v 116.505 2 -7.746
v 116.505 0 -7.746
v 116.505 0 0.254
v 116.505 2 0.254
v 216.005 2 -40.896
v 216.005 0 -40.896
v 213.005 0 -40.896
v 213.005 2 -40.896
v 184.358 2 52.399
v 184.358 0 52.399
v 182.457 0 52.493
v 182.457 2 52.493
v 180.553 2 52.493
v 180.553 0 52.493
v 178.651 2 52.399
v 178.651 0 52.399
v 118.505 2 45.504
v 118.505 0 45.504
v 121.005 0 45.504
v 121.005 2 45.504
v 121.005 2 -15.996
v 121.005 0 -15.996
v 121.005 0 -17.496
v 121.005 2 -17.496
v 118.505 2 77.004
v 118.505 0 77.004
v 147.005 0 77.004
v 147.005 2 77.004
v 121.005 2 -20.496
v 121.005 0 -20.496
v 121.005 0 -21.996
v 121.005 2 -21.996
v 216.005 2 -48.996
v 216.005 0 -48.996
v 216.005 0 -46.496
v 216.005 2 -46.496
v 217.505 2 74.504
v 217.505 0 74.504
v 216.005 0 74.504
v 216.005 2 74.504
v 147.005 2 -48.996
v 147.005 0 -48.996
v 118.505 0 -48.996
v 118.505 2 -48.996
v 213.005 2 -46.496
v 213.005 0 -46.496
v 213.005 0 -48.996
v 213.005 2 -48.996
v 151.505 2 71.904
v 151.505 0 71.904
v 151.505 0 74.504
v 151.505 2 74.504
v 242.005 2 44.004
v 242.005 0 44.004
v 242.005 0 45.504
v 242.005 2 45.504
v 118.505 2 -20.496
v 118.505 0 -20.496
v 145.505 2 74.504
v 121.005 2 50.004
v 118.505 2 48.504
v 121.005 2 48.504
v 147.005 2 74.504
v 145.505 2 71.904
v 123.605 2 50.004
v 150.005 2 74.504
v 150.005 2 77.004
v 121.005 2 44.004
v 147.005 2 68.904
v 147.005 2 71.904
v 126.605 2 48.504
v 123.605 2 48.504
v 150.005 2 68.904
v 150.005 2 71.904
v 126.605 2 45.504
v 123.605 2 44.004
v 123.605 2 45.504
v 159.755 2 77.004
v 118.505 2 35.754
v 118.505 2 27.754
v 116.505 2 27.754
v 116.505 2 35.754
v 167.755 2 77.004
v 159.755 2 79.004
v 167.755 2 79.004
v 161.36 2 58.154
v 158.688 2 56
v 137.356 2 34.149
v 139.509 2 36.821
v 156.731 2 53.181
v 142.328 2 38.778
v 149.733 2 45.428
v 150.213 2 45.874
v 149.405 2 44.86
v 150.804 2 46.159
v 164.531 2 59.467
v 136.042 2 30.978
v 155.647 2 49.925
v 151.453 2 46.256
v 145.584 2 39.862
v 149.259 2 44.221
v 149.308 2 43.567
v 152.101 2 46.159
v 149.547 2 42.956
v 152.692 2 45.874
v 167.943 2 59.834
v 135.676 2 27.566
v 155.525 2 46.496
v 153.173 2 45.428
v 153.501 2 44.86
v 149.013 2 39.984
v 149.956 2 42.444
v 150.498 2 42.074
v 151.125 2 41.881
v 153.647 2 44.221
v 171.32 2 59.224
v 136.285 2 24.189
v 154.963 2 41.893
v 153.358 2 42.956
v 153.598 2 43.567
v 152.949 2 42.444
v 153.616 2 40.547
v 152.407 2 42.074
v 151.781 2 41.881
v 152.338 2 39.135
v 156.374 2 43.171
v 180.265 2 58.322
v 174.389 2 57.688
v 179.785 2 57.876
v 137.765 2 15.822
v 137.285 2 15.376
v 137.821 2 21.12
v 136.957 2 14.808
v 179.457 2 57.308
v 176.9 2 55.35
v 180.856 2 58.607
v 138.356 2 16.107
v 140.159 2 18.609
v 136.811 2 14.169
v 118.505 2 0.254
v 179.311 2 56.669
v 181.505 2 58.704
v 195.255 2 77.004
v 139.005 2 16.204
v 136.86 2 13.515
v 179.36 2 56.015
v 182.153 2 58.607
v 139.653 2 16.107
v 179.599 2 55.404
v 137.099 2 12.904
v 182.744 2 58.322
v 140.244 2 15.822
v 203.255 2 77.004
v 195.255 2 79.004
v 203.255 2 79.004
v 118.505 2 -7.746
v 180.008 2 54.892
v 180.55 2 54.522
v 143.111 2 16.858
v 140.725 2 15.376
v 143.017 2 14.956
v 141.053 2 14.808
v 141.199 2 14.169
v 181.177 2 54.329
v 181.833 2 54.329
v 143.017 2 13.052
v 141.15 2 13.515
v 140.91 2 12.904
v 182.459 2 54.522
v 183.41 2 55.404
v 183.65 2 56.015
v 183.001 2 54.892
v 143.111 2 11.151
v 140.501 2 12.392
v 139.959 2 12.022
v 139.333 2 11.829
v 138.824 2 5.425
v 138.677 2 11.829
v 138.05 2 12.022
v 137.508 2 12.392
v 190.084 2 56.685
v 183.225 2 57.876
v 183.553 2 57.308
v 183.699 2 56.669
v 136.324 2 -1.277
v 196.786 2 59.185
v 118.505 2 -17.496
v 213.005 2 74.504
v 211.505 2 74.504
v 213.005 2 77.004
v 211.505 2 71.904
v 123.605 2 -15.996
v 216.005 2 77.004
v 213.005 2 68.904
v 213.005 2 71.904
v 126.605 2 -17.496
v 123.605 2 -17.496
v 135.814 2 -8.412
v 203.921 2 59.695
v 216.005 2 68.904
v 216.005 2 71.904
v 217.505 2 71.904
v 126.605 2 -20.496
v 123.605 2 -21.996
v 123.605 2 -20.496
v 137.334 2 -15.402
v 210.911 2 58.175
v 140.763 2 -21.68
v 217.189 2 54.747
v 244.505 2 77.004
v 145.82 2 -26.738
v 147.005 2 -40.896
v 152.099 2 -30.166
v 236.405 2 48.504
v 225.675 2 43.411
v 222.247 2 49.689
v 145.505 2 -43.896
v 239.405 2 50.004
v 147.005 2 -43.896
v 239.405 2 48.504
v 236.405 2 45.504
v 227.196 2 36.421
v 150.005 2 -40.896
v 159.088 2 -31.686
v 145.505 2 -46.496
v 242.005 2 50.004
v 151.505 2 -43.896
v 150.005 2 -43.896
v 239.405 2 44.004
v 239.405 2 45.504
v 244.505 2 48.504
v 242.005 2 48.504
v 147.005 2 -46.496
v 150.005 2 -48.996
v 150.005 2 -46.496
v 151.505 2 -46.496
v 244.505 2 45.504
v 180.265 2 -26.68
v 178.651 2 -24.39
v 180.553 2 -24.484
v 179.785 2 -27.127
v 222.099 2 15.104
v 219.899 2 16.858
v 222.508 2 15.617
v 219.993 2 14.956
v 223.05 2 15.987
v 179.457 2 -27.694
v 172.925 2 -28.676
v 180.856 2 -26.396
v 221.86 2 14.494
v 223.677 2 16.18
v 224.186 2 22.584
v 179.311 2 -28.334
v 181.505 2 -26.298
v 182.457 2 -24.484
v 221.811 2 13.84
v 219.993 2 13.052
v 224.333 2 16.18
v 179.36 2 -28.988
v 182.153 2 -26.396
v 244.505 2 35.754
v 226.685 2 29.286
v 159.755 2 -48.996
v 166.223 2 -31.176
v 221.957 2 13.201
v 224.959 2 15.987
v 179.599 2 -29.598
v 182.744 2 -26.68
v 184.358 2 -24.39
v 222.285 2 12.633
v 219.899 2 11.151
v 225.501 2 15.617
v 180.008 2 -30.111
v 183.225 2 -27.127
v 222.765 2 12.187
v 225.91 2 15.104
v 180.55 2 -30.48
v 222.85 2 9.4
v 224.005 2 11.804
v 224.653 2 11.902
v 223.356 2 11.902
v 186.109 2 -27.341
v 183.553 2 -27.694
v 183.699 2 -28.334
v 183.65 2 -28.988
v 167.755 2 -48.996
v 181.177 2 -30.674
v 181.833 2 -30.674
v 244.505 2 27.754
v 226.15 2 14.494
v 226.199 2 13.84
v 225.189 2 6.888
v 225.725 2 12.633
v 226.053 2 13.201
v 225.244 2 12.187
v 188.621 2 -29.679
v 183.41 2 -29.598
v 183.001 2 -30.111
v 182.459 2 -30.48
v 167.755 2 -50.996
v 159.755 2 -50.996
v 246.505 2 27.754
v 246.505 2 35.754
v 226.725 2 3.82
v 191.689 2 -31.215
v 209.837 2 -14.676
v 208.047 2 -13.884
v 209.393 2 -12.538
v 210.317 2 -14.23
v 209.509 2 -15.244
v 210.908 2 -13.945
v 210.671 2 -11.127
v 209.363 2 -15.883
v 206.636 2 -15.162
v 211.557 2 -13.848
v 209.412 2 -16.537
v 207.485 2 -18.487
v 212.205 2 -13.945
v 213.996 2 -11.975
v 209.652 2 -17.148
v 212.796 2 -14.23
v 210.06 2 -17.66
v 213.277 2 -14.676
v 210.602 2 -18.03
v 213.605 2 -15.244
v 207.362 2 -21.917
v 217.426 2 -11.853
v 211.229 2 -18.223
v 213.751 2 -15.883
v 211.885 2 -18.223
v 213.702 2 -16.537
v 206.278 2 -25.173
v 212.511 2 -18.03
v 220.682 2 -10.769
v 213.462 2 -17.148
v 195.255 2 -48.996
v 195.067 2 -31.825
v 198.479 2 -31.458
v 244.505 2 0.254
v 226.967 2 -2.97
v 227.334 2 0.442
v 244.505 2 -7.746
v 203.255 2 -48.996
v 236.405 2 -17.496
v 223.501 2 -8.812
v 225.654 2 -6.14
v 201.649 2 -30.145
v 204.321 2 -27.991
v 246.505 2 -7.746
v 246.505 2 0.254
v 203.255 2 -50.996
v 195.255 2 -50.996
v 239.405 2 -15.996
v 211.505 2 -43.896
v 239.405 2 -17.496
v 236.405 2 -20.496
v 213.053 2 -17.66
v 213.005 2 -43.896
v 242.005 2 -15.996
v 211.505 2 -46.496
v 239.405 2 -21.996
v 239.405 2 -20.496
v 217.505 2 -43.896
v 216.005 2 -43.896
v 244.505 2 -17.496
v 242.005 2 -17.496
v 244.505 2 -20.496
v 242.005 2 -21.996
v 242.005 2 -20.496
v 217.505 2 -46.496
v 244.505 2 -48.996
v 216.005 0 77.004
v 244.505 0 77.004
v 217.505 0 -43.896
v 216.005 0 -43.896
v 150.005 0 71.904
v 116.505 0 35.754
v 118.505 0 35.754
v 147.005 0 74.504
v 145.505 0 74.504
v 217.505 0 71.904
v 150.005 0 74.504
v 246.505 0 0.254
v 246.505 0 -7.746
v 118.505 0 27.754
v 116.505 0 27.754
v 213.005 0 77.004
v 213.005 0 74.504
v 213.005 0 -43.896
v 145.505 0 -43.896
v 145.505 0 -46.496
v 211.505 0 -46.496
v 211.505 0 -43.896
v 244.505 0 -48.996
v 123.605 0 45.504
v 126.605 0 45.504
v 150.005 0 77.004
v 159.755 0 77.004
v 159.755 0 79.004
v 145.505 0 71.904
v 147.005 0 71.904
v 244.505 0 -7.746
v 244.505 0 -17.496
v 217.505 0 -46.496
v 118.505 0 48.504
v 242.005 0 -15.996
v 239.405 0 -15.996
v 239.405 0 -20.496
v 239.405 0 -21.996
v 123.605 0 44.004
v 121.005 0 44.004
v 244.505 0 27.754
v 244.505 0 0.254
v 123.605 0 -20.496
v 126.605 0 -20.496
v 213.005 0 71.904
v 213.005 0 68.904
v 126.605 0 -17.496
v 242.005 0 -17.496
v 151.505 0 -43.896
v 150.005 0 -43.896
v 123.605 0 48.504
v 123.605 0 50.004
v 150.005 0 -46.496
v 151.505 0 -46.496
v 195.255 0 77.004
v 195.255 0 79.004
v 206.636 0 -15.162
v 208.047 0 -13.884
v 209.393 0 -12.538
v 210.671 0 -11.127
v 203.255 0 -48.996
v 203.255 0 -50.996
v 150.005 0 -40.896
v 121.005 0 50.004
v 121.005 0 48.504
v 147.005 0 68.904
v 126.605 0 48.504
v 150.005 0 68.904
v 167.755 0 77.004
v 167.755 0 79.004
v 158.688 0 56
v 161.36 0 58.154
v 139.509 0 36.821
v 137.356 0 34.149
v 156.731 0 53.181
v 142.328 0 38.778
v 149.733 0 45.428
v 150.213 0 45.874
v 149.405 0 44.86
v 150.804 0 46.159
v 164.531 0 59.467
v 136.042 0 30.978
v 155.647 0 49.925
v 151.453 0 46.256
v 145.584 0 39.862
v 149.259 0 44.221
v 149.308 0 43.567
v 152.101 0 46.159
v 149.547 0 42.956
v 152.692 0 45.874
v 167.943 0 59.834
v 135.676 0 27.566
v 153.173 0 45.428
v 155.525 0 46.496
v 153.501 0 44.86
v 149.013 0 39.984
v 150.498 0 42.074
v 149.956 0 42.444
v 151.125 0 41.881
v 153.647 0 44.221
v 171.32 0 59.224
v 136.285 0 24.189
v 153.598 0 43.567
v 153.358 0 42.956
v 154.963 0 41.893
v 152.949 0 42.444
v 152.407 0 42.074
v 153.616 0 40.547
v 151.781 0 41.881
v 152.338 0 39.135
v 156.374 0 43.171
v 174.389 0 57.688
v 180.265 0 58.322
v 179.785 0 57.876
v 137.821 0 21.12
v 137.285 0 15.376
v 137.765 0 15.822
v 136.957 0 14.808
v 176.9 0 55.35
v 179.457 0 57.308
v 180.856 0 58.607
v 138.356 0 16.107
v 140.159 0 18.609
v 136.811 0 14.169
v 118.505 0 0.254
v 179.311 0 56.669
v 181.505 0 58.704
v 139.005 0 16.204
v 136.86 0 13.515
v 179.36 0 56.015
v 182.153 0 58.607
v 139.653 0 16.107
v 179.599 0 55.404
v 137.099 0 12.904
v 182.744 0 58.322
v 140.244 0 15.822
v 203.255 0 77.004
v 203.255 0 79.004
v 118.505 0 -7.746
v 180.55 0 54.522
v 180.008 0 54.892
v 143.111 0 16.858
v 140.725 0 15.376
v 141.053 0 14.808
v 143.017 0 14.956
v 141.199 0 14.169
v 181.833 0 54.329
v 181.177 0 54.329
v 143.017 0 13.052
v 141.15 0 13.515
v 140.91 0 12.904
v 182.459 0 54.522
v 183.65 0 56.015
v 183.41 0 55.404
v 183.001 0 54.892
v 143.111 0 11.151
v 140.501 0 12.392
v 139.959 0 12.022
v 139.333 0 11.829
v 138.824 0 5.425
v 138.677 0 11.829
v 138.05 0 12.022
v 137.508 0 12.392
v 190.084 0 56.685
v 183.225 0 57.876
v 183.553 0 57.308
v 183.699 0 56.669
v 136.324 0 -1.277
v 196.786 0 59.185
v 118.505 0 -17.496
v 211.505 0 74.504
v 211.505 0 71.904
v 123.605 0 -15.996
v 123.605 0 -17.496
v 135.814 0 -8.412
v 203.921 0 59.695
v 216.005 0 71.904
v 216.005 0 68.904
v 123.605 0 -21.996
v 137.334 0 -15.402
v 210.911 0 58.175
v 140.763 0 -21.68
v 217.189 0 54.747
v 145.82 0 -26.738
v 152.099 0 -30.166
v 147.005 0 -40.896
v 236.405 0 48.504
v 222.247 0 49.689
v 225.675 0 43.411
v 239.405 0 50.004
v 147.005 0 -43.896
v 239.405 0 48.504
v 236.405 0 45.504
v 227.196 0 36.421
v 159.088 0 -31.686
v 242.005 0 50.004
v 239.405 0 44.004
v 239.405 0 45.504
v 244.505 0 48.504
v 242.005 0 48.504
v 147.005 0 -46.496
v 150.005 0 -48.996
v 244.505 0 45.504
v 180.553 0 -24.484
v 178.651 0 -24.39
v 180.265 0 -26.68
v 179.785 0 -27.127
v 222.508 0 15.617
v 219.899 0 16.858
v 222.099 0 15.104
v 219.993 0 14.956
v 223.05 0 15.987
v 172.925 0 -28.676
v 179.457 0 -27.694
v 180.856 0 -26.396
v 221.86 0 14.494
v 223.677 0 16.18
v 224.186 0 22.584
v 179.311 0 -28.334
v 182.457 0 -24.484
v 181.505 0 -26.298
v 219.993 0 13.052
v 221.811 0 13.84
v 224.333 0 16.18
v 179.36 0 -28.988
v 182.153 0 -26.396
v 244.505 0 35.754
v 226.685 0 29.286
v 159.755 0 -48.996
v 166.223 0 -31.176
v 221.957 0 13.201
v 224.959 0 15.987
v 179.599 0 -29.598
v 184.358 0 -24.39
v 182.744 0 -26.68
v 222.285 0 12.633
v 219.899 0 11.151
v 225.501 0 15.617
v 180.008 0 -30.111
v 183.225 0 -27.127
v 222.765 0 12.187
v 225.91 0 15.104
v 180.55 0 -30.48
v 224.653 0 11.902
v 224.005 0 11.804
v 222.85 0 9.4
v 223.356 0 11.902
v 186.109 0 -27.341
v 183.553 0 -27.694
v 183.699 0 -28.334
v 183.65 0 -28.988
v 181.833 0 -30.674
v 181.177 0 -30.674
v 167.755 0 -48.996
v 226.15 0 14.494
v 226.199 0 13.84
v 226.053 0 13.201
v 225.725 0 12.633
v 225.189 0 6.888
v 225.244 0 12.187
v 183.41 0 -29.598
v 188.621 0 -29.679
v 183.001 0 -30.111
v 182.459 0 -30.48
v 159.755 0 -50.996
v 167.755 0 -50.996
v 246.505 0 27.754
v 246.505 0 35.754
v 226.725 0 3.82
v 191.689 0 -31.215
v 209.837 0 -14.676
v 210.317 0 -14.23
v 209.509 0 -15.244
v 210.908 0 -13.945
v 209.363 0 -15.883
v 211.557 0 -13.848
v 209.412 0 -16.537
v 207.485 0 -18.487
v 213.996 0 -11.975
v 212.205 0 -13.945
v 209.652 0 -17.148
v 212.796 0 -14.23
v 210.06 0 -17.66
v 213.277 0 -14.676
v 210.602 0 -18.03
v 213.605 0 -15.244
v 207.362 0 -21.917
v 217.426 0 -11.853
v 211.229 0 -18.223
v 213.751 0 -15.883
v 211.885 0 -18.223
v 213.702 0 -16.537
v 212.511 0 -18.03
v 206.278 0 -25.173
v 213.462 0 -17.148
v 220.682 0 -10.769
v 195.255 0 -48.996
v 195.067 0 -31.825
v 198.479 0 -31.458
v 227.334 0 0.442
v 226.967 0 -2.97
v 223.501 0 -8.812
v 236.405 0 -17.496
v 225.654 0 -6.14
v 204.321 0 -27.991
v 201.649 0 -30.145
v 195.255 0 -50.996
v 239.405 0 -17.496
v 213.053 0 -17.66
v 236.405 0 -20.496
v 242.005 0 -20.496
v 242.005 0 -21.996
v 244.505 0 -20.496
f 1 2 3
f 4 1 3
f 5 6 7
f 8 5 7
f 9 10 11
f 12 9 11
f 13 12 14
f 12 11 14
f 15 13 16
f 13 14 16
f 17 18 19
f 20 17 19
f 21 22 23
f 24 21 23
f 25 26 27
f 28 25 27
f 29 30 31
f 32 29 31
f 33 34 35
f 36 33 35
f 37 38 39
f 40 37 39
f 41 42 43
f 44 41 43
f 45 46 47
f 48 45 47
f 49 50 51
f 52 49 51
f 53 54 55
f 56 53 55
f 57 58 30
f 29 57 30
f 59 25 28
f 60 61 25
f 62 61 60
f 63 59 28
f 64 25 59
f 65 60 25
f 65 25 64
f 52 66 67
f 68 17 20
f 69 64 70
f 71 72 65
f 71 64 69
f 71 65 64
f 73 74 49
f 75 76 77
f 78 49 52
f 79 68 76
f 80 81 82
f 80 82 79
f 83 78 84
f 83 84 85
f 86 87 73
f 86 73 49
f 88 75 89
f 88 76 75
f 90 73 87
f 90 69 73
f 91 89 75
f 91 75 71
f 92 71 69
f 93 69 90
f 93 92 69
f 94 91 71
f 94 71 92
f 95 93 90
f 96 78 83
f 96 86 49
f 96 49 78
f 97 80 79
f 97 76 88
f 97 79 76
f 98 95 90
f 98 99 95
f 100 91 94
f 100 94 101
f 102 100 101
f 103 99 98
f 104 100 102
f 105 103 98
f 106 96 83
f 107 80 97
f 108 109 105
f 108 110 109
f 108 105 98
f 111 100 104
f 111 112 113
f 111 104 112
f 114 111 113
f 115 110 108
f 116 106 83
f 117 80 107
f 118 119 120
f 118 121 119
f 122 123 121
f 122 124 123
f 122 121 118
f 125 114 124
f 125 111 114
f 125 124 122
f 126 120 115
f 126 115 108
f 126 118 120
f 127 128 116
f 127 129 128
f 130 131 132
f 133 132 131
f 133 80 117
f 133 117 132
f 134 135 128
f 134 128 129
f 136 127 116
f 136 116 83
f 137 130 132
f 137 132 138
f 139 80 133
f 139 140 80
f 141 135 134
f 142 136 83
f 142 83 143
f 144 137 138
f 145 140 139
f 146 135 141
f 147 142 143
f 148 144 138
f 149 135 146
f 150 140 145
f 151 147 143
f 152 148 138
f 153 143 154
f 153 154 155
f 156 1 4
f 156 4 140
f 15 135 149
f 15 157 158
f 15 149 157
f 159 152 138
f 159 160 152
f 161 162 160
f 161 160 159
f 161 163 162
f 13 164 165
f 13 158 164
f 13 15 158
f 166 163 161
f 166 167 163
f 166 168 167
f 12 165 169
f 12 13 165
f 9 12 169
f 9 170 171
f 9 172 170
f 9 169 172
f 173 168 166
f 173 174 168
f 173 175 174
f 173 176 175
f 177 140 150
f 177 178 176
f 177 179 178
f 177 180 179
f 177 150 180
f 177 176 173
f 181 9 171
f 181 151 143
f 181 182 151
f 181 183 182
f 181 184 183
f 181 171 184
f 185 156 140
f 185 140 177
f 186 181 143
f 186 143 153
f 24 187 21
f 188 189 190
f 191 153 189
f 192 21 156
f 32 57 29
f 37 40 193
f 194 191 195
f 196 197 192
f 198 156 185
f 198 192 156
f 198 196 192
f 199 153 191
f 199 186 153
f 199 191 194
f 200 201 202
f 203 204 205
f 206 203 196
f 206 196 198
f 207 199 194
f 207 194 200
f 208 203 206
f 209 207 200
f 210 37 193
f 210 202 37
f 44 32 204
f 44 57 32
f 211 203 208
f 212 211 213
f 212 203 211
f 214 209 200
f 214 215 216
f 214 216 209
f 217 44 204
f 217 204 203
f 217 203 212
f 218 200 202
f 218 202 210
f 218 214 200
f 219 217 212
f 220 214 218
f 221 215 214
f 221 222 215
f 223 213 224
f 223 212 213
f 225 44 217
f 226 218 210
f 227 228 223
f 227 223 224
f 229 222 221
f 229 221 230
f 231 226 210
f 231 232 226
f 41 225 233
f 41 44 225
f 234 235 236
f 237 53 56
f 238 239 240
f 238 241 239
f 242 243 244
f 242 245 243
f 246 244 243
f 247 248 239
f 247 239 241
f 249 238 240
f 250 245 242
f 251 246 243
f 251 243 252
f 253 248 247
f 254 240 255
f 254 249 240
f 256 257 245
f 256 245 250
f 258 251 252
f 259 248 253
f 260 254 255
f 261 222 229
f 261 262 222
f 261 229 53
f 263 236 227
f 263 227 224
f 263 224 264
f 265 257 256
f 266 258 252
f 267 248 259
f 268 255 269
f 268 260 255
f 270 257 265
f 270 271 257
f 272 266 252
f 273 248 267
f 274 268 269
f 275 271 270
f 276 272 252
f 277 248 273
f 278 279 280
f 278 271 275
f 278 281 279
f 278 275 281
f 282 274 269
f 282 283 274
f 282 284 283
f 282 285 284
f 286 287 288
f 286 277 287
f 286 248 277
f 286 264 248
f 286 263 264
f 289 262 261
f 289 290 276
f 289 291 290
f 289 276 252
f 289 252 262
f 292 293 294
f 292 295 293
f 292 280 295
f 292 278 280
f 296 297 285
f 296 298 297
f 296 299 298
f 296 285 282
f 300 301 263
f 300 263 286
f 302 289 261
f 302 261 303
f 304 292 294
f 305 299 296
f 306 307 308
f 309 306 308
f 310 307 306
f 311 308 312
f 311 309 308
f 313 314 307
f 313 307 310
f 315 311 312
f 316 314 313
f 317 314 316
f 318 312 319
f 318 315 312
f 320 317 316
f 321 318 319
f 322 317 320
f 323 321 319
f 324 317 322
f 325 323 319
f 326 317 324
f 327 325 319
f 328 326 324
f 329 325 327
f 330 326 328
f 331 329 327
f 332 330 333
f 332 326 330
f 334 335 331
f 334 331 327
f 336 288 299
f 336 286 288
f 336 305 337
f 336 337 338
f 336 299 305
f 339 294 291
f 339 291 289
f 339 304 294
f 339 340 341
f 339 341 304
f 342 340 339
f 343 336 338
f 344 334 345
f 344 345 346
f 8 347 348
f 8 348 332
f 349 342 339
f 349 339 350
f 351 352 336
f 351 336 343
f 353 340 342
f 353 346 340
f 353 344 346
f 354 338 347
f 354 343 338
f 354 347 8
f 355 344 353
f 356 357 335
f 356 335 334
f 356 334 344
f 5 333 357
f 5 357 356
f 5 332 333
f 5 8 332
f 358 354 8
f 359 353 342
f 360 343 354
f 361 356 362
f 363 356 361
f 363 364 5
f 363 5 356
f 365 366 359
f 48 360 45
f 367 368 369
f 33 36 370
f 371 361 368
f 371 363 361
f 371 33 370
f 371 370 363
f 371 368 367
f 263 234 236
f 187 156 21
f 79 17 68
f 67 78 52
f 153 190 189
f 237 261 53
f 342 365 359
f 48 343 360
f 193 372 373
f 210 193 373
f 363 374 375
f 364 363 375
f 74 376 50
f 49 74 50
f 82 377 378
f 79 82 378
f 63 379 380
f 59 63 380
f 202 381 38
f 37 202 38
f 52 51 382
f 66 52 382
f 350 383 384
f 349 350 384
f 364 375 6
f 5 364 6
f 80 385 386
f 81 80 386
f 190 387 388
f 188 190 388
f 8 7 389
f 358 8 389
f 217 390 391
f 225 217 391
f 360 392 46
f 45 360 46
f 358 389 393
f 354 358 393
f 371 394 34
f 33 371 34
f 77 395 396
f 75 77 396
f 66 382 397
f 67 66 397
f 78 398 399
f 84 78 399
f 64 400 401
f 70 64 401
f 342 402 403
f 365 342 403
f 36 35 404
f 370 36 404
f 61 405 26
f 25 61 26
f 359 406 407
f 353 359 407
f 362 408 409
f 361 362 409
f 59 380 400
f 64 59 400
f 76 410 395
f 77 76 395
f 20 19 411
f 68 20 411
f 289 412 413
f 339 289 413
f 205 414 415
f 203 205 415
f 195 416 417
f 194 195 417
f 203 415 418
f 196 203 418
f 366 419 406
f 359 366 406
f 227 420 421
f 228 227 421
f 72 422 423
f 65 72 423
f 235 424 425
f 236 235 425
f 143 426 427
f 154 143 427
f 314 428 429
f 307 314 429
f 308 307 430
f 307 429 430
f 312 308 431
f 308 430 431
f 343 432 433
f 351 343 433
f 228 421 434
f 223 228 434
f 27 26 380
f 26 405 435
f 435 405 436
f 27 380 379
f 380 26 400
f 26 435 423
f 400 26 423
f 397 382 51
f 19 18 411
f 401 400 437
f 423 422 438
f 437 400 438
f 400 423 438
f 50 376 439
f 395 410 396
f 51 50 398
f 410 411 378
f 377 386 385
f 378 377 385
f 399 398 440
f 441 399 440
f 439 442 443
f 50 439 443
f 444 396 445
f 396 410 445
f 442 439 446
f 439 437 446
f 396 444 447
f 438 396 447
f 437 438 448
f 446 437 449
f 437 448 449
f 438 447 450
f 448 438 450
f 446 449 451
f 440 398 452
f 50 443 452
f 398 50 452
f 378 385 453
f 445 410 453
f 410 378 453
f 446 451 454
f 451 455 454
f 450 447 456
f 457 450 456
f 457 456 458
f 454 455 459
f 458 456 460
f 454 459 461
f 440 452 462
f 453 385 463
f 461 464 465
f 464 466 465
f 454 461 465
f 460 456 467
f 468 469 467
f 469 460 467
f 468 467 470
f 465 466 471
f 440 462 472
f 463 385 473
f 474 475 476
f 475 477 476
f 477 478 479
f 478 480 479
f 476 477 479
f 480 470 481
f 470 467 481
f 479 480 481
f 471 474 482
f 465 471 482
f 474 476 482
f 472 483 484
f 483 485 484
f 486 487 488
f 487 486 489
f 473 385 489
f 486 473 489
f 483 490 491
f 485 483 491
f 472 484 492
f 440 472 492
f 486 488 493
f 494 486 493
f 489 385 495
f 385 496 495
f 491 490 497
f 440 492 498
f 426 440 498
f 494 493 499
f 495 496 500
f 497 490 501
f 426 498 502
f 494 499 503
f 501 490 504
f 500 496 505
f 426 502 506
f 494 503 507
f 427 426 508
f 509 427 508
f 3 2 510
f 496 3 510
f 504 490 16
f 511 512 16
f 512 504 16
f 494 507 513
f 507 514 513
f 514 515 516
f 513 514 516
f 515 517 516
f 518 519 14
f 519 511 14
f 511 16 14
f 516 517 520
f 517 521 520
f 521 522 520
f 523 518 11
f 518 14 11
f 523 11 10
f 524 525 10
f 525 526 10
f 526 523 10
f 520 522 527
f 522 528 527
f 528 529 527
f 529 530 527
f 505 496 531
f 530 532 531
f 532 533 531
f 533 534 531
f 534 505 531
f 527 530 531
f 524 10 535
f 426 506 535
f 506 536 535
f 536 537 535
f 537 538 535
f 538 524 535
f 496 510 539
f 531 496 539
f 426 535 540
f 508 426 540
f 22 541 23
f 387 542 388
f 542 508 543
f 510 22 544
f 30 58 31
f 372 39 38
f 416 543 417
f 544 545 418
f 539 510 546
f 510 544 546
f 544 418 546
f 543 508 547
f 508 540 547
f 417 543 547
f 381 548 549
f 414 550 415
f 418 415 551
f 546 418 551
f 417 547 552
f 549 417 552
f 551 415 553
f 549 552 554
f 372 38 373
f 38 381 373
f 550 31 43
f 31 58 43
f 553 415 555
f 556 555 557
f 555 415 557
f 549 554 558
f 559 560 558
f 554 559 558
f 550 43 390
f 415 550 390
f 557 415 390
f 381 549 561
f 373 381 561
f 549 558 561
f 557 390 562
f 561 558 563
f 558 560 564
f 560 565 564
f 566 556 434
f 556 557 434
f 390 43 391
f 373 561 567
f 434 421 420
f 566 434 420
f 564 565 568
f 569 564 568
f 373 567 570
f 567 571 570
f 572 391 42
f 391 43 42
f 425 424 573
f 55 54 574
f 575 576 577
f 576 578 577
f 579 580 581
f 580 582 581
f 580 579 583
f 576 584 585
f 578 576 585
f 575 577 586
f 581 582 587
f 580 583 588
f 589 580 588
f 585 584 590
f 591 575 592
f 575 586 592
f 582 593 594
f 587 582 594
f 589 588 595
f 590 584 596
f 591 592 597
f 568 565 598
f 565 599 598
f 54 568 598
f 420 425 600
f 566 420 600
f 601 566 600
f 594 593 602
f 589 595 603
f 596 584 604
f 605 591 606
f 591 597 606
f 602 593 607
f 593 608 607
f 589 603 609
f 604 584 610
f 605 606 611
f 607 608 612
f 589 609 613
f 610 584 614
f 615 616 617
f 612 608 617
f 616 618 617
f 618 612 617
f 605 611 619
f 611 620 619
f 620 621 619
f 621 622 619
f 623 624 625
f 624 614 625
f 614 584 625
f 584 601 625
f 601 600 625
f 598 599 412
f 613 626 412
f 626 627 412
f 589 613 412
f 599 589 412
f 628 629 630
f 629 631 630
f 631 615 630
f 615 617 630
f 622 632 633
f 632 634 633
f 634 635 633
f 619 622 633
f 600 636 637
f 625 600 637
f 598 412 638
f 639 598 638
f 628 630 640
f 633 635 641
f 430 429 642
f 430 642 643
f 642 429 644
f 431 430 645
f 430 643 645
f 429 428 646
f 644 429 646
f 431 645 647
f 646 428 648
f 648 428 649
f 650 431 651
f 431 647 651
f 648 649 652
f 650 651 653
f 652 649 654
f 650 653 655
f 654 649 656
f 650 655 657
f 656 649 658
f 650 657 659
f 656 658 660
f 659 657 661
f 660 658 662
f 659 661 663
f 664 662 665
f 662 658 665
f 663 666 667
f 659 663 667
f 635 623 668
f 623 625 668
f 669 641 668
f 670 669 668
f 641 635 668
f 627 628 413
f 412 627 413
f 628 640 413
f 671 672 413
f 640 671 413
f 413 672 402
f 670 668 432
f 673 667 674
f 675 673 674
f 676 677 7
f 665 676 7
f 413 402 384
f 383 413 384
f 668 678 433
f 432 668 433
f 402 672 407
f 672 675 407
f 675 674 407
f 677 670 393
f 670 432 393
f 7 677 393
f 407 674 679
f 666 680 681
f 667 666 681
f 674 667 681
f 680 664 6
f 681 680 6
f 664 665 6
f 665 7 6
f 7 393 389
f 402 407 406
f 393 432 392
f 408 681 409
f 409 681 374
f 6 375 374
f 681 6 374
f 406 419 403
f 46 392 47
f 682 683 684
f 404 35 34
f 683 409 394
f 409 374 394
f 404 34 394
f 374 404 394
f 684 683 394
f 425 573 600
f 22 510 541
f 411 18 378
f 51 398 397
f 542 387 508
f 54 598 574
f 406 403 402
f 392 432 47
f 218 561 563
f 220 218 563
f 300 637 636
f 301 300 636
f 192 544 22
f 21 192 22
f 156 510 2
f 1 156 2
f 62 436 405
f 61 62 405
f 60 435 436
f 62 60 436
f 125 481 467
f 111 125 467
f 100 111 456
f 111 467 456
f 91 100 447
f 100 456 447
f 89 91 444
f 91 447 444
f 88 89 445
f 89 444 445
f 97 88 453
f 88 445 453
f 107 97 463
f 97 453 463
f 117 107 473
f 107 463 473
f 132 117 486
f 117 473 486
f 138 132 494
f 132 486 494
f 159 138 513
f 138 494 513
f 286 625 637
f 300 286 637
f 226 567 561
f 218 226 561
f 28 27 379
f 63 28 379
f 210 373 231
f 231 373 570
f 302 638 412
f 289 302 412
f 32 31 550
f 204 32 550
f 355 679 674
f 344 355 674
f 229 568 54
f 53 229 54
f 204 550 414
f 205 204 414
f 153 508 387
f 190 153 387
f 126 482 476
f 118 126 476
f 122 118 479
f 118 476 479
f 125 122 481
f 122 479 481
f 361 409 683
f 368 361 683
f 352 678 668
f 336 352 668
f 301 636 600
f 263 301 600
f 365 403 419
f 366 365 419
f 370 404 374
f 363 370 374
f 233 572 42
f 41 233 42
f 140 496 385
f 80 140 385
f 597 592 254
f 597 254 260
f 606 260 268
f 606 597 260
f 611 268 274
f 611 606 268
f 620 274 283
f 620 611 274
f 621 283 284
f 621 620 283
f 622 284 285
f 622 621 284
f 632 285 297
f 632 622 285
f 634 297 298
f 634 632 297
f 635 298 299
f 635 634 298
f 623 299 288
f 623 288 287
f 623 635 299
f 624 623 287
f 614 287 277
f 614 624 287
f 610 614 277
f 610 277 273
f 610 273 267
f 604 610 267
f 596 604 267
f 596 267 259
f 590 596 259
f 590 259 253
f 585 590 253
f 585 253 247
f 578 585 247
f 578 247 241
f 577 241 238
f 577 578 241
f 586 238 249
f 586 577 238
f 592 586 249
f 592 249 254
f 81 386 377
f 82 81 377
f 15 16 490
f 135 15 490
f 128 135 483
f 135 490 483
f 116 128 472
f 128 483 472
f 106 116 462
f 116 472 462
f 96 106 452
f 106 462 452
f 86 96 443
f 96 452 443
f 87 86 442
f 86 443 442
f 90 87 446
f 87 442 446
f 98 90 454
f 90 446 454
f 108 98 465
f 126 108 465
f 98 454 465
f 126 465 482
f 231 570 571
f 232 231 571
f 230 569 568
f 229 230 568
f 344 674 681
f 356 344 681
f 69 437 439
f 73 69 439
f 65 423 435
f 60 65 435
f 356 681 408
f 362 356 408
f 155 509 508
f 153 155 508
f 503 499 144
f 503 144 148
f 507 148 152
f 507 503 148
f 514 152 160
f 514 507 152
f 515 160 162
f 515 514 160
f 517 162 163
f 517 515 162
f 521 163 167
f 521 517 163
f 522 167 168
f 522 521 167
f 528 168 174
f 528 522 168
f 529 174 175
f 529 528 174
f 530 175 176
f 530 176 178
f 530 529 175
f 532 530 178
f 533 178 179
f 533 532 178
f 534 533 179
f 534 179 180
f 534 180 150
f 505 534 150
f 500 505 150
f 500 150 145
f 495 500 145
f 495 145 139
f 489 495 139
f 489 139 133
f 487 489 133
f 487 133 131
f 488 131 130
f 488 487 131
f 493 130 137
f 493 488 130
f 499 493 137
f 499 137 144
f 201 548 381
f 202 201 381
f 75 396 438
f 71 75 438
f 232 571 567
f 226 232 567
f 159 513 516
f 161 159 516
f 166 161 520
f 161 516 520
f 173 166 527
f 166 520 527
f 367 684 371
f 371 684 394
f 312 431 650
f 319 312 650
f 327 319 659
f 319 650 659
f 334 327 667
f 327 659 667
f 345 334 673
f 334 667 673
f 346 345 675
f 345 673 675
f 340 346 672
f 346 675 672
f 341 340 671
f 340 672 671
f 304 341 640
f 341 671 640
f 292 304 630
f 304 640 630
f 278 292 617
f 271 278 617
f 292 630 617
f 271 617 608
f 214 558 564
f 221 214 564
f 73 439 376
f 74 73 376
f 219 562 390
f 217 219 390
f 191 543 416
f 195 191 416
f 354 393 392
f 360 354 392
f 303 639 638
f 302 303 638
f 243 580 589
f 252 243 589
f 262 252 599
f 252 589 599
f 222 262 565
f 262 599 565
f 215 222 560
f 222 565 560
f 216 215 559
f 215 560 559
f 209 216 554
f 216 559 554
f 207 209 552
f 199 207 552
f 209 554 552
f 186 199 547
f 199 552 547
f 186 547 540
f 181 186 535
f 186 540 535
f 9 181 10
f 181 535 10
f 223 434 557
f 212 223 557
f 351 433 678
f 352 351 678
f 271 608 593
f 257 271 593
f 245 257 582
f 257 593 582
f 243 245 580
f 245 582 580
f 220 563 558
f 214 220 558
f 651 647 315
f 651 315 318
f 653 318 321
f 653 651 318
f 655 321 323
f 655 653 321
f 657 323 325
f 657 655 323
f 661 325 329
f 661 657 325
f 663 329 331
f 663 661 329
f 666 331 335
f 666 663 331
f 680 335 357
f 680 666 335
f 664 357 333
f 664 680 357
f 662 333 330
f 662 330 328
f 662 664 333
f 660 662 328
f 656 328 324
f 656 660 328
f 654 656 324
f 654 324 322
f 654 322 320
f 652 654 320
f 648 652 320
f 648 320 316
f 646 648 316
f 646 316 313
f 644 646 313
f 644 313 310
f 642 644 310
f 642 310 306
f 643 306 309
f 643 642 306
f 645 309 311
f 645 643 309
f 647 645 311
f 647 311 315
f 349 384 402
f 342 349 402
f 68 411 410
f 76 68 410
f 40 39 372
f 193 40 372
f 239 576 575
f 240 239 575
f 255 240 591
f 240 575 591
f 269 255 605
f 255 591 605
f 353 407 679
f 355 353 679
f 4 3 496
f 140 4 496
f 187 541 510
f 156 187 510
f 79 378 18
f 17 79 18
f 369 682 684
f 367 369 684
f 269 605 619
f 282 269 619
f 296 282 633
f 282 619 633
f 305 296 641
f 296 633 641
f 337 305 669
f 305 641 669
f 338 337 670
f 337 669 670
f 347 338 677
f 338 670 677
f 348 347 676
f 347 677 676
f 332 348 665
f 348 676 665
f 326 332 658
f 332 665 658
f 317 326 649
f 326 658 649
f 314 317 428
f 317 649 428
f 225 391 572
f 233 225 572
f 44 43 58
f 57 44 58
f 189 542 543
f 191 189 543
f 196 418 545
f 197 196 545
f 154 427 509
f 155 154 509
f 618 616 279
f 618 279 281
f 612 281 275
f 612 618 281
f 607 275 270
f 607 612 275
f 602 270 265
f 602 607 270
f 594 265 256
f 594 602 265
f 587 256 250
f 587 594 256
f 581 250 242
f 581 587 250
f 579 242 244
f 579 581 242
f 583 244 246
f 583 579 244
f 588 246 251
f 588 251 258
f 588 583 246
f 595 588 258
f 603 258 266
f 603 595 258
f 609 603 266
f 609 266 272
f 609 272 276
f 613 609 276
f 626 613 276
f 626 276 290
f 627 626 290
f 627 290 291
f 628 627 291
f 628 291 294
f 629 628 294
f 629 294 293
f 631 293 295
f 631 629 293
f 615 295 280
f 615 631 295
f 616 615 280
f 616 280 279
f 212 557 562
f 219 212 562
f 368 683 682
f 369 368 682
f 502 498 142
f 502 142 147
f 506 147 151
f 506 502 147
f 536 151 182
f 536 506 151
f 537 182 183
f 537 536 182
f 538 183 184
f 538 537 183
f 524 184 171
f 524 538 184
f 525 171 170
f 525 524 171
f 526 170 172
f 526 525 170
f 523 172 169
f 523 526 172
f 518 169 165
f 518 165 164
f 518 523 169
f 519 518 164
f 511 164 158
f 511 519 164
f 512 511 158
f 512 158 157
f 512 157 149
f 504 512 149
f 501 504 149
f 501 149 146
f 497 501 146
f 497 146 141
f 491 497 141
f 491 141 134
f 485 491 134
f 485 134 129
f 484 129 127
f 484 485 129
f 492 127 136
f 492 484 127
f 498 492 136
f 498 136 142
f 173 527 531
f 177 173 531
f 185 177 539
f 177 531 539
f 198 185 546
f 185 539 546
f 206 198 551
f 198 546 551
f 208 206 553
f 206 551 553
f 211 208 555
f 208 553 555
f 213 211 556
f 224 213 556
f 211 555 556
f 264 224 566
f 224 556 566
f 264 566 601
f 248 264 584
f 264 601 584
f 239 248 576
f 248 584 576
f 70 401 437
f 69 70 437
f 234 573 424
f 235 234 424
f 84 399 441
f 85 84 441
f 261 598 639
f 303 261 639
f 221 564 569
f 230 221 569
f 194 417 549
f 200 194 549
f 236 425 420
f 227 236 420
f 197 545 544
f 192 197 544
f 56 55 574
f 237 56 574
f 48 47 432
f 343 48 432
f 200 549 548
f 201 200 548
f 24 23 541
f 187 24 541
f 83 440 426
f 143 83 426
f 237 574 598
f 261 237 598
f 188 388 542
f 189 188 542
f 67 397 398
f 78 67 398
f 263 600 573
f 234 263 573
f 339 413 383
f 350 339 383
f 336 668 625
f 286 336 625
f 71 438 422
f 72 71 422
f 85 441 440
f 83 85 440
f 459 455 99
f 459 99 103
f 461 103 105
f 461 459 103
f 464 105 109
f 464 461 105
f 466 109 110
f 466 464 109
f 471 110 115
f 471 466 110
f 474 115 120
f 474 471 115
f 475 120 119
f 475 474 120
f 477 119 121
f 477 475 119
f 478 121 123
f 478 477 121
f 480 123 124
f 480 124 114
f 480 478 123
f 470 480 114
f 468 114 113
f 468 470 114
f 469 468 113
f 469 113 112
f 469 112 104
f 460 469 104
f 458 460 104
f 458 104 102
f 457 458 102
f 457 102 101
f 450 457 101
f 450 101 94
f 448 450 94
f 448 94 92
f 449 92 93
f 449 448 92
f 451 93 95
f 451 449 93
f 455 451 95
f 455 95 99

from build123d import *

# Parameters (mm, degrees)
SKETCH_1_R      = 2.2
EXTRUDE_1_DEPTH = 2


with BuildPart() as part:
    # 草图1 → 凸台-拉伸1 (new body)
    with BuildSketch(Plane(origin=(0, 0, 0), x_dir=(1, 0, 0), z_dir=(0, 1, 0))):
        Polygon((159.754738648, 48.995603023), (150.004738648, 48.995603023), (150.004738648, 46.495603023), (151.504738648, 46.495603023), (151.504738648, 43.895603023), (150.004738648, 43.895603023), (150.004738648, 40.895603023), (147.004738648, 40.895603023), (147.004738648, 43.895603023), (145.504738648, 43.895603023), (145.504738648, 46.495603023), (147.004738648, 46.495603023), (147.004738648, 48.995603023), (138.604738648, 48.995603023), (133.504738648, 48.995603023), (118.504738648, 48.995603023), (118.504738648, 33.995603023), (118.504738648, 21.495603023), (118.504738648, 20.495603023), (121.004738648, 20.495603023), (121.004738648, 21.995603023), (123.604738648, 21.995603023), (123.604738648, 20.495603023), (126.604738648, 20.495603023), (126.604738648, 17.495603023), (123.604738648, 17.495603023), (123.604738648, 15.995603023), (121.004738648, 15.995603023), (121.004738648, 17.495603023), (118.504738648, 17.495603023), (118.504738648, 7.745603023), (116.504738648, 7.745603023), (116.504738648, -0.254396977), (118.504738648, -0.254396977), (118.504738648, -27.754396977), (116.504738648, -27.754396977), (116.504738648, -35.754396977), (118.504738648, -35.754396977), (118.504738648, -45.504396977), (121.004738648, -45.504396977), (121.004738648, -44.004396977), (123.604738648, -44.004396977), (123.604738648, -45.504396977), (126.604738648, -45.504396977), (126.604738648, -48.504396977), (123.604738648, -48.504396977), (123.604738648, -50.004396977), (121.004738648, -50.004396977), (121.004738648, -48.504396977), (118.504738648, -48.504396977), (118.504738648, -56.904396977), (118.504738648, -62.004396977), (118.504738648, -77.004396977), (133.504738648, -77.004396977), (146.004738648, -77.004396977), (147.004738648, -77.004396977), (147.004738648, -74.504396977), (145.504738648, -74.504396977), (145.504738648, -71.904396977), (147.004738648, -71.904396977), (147.004738648, -68.904396977), (150.004738648, -68.904396977), (150.004738648, -71.904396977), (151.504738648, -71.904396977), (151.504738648, -74.504396977), (150.004738648, -74.504396977), (150.004738648, -77.004396977), (159.754738648, -77.004396977), (159.754738648, -79.004396977), (167.754738648, -79.004396977), (167.754738648, -77.004396977), (195.254738648, -77.004396977), (195.254738648, -79.004396977), (203.254738648, -79.004396977), (203.254738648, -77.004396977), (213.004738648, -77.004396977), (213.004738648, -74.504396977), (211.504738648, -74.504396977), (211.504738648, -71.904396977), (213.004738648, -71.904396977), (213.004738648, -68.904396977), (216.004738648, -68.904396977), (216.004738648, -71.904396977), (217.504738648, -71.904396977), (217.504738648, -74.504396977), (216.004738648, -74.504396977), (216.004738648, -77.004396977), (224.404738648, -77.004396977), (229.504738648, -77.004396977), (244.504738648, -77.004396977), (244.504738648, -62.004396977), (244.504738648, -49.504396977), (244.504738648, -48.504396977), (242.004738648, -48.504396977), (242.004738648, -50.004396977), (239.404738648, -50.004396977), (239.404738648, -48.504396977), (236.404738648, -48.504396977), (236.404738648, -45.504396977), (239.404738648, -45.504396977), (239.404738648, -44.004396977), (242.004738648, -44.004396977), (242.004738648, -45.504396977), (244.504738648, -45.504396977), (244.504738648, -35.754396977), (246.504738648, -35.754396977), (246.504738648, -27.754396977), (244.504738648, -27.754396977), (244.504738648, -0.254396977), (246.504738648, -0.254396977), (246.504738648, 7.745603023), (244.504738648, 7.745603023), (244.504738648, 17.495603023), (242.004738648, 17.495603023), (242.004738648, 15.995603023), (239.404738648, 15.995603023), (239.404738648, 17.495603023), (236.404738648, 17.495603023), (236.404738648, 20.495603023), (239.404738648, 20.495603023), (239.404738648, 21.995603023), (242.004738648, 21.995603023), (242.004738648, 20.495603023), (244.504738648, 20.495603023), (244.504738648, 28.895603023), (244.504738648, 33.995603023), (244.504738648, 48.995603023), (229.504738648, 48.995603023), (217.004738648, 48.995603023), (216.004738648, 48.995603023), (216.004738648, 46.495603023), (217.504738648, 46.495603023), (217.504738648, 43.895603023), (216.004738648, 43.895603023), (216.004738648, 40.895603023), (213.004738648, 40.895603023), (213.004738648, 43.895603023), (211.504738648, 43.895603023), (211.504738648, 46.495603023), (213.004738648, 46.495603023), (213.004738648, 48.995603023), (203.254738648, 48.995603023), (203.254738648, 50.995603023), (195.254738648, 50.995603023), (195.254738648, 48.995603023), (167.754738648, 48.995603023), (167.754738648, 50.995603023), (159.754738648, 50.995603023), align=None)
        with Locations(Location((181.504738648, -56.504396977, 0), (0, 0, 270))):
            Circle(SKETCH_1_R, mode=Mode.SUBTRACT)
        with Locations(Location((151.452700448, -44.056435178, 0), (0, 0, 270))):
            Circle(SKETCH_1_R, mode=Mode.SUBTRACT)
        with Locations(Location((139.004738648, -14.004396977, 0), (0, 0, 270))):
            Circle(SKETCH_1_R, mode=Mode.SUBTRACT)
        with Locations(Location((224.004738648, -14.004396977, 0), (0, 0, 90))):
            Circle(SKETCH_1_R, mode=Mode.SUBTRACT)
        with Locations(Location((211.556776849, 16.047641223, 0), (0, 0, 270))):
            Circle(SKETCH_1_R, mode=Mode.SUBTRACT)
        with Locations(Location((181.504738648, 28.49819903, 0), (0, 0, 270))):
            Circle(SKETCH_1_R, mode=Mode.SUBTRACT)
        with BuildLine():
            ThreePointArc((156.373636186, -43.170776407), (154.281127573, -41.228008053), (152.338359218, -39.135499439))
            ThreePointArc((152.338359218, -39.135499439), (136.585624733, -32.610503171), (143.110621001, -16.857768685))
            ThreePointArc((143.110621001, -16.857768685), (143.004738648, -14.004396977), (143.110621001, -11.15102527))
            ThreePointArc((143.110621001, -11.15102527), (143.110621001, 24.38972067), (178.65136694, 24.38972067))
            ThreePointArc((178.65136694, 24.38972067), (181.504738648, 24.495603023), (184.358110356, 24.38972067))
            ThreePointArc((184.358110356, 24.38972067), (200.110844842, 30.914716938), (206.63584111, 15.161982452))
            ThreePointArc((206.63584111, 15.161982452), (208.728349724, 13.219214098), (210.671118078, 11.126705484))
            ThreePointArc((210.671118078, 11.126705484), (226.423852564, 4.601709216), (219.898856295, -11.15102527))
            ThreePointArc((219.898856295, -11.15102527), (220.004738648, -14.004396977), (219.898856295, -16.857768685))
            ThreePointArc((219.898856295, -16.857768685), (219.898856295, -52.398514625), (184.358110356, -52.398514625))
            ThreePointArc((184.358110356, -52.398514625), (181.504738648, -52.504396977), (178.65136694, -52.398514625))
            ThreePointArc((178.65136694, -52.398514625), (162.898632455, -58.923510893), (156.373636186, -43.170776407))
        make_face(mode=Mode.SUBTRACT)
    extrude(amount=EXTRUDE_1_DEPTH)


solid = part.part
